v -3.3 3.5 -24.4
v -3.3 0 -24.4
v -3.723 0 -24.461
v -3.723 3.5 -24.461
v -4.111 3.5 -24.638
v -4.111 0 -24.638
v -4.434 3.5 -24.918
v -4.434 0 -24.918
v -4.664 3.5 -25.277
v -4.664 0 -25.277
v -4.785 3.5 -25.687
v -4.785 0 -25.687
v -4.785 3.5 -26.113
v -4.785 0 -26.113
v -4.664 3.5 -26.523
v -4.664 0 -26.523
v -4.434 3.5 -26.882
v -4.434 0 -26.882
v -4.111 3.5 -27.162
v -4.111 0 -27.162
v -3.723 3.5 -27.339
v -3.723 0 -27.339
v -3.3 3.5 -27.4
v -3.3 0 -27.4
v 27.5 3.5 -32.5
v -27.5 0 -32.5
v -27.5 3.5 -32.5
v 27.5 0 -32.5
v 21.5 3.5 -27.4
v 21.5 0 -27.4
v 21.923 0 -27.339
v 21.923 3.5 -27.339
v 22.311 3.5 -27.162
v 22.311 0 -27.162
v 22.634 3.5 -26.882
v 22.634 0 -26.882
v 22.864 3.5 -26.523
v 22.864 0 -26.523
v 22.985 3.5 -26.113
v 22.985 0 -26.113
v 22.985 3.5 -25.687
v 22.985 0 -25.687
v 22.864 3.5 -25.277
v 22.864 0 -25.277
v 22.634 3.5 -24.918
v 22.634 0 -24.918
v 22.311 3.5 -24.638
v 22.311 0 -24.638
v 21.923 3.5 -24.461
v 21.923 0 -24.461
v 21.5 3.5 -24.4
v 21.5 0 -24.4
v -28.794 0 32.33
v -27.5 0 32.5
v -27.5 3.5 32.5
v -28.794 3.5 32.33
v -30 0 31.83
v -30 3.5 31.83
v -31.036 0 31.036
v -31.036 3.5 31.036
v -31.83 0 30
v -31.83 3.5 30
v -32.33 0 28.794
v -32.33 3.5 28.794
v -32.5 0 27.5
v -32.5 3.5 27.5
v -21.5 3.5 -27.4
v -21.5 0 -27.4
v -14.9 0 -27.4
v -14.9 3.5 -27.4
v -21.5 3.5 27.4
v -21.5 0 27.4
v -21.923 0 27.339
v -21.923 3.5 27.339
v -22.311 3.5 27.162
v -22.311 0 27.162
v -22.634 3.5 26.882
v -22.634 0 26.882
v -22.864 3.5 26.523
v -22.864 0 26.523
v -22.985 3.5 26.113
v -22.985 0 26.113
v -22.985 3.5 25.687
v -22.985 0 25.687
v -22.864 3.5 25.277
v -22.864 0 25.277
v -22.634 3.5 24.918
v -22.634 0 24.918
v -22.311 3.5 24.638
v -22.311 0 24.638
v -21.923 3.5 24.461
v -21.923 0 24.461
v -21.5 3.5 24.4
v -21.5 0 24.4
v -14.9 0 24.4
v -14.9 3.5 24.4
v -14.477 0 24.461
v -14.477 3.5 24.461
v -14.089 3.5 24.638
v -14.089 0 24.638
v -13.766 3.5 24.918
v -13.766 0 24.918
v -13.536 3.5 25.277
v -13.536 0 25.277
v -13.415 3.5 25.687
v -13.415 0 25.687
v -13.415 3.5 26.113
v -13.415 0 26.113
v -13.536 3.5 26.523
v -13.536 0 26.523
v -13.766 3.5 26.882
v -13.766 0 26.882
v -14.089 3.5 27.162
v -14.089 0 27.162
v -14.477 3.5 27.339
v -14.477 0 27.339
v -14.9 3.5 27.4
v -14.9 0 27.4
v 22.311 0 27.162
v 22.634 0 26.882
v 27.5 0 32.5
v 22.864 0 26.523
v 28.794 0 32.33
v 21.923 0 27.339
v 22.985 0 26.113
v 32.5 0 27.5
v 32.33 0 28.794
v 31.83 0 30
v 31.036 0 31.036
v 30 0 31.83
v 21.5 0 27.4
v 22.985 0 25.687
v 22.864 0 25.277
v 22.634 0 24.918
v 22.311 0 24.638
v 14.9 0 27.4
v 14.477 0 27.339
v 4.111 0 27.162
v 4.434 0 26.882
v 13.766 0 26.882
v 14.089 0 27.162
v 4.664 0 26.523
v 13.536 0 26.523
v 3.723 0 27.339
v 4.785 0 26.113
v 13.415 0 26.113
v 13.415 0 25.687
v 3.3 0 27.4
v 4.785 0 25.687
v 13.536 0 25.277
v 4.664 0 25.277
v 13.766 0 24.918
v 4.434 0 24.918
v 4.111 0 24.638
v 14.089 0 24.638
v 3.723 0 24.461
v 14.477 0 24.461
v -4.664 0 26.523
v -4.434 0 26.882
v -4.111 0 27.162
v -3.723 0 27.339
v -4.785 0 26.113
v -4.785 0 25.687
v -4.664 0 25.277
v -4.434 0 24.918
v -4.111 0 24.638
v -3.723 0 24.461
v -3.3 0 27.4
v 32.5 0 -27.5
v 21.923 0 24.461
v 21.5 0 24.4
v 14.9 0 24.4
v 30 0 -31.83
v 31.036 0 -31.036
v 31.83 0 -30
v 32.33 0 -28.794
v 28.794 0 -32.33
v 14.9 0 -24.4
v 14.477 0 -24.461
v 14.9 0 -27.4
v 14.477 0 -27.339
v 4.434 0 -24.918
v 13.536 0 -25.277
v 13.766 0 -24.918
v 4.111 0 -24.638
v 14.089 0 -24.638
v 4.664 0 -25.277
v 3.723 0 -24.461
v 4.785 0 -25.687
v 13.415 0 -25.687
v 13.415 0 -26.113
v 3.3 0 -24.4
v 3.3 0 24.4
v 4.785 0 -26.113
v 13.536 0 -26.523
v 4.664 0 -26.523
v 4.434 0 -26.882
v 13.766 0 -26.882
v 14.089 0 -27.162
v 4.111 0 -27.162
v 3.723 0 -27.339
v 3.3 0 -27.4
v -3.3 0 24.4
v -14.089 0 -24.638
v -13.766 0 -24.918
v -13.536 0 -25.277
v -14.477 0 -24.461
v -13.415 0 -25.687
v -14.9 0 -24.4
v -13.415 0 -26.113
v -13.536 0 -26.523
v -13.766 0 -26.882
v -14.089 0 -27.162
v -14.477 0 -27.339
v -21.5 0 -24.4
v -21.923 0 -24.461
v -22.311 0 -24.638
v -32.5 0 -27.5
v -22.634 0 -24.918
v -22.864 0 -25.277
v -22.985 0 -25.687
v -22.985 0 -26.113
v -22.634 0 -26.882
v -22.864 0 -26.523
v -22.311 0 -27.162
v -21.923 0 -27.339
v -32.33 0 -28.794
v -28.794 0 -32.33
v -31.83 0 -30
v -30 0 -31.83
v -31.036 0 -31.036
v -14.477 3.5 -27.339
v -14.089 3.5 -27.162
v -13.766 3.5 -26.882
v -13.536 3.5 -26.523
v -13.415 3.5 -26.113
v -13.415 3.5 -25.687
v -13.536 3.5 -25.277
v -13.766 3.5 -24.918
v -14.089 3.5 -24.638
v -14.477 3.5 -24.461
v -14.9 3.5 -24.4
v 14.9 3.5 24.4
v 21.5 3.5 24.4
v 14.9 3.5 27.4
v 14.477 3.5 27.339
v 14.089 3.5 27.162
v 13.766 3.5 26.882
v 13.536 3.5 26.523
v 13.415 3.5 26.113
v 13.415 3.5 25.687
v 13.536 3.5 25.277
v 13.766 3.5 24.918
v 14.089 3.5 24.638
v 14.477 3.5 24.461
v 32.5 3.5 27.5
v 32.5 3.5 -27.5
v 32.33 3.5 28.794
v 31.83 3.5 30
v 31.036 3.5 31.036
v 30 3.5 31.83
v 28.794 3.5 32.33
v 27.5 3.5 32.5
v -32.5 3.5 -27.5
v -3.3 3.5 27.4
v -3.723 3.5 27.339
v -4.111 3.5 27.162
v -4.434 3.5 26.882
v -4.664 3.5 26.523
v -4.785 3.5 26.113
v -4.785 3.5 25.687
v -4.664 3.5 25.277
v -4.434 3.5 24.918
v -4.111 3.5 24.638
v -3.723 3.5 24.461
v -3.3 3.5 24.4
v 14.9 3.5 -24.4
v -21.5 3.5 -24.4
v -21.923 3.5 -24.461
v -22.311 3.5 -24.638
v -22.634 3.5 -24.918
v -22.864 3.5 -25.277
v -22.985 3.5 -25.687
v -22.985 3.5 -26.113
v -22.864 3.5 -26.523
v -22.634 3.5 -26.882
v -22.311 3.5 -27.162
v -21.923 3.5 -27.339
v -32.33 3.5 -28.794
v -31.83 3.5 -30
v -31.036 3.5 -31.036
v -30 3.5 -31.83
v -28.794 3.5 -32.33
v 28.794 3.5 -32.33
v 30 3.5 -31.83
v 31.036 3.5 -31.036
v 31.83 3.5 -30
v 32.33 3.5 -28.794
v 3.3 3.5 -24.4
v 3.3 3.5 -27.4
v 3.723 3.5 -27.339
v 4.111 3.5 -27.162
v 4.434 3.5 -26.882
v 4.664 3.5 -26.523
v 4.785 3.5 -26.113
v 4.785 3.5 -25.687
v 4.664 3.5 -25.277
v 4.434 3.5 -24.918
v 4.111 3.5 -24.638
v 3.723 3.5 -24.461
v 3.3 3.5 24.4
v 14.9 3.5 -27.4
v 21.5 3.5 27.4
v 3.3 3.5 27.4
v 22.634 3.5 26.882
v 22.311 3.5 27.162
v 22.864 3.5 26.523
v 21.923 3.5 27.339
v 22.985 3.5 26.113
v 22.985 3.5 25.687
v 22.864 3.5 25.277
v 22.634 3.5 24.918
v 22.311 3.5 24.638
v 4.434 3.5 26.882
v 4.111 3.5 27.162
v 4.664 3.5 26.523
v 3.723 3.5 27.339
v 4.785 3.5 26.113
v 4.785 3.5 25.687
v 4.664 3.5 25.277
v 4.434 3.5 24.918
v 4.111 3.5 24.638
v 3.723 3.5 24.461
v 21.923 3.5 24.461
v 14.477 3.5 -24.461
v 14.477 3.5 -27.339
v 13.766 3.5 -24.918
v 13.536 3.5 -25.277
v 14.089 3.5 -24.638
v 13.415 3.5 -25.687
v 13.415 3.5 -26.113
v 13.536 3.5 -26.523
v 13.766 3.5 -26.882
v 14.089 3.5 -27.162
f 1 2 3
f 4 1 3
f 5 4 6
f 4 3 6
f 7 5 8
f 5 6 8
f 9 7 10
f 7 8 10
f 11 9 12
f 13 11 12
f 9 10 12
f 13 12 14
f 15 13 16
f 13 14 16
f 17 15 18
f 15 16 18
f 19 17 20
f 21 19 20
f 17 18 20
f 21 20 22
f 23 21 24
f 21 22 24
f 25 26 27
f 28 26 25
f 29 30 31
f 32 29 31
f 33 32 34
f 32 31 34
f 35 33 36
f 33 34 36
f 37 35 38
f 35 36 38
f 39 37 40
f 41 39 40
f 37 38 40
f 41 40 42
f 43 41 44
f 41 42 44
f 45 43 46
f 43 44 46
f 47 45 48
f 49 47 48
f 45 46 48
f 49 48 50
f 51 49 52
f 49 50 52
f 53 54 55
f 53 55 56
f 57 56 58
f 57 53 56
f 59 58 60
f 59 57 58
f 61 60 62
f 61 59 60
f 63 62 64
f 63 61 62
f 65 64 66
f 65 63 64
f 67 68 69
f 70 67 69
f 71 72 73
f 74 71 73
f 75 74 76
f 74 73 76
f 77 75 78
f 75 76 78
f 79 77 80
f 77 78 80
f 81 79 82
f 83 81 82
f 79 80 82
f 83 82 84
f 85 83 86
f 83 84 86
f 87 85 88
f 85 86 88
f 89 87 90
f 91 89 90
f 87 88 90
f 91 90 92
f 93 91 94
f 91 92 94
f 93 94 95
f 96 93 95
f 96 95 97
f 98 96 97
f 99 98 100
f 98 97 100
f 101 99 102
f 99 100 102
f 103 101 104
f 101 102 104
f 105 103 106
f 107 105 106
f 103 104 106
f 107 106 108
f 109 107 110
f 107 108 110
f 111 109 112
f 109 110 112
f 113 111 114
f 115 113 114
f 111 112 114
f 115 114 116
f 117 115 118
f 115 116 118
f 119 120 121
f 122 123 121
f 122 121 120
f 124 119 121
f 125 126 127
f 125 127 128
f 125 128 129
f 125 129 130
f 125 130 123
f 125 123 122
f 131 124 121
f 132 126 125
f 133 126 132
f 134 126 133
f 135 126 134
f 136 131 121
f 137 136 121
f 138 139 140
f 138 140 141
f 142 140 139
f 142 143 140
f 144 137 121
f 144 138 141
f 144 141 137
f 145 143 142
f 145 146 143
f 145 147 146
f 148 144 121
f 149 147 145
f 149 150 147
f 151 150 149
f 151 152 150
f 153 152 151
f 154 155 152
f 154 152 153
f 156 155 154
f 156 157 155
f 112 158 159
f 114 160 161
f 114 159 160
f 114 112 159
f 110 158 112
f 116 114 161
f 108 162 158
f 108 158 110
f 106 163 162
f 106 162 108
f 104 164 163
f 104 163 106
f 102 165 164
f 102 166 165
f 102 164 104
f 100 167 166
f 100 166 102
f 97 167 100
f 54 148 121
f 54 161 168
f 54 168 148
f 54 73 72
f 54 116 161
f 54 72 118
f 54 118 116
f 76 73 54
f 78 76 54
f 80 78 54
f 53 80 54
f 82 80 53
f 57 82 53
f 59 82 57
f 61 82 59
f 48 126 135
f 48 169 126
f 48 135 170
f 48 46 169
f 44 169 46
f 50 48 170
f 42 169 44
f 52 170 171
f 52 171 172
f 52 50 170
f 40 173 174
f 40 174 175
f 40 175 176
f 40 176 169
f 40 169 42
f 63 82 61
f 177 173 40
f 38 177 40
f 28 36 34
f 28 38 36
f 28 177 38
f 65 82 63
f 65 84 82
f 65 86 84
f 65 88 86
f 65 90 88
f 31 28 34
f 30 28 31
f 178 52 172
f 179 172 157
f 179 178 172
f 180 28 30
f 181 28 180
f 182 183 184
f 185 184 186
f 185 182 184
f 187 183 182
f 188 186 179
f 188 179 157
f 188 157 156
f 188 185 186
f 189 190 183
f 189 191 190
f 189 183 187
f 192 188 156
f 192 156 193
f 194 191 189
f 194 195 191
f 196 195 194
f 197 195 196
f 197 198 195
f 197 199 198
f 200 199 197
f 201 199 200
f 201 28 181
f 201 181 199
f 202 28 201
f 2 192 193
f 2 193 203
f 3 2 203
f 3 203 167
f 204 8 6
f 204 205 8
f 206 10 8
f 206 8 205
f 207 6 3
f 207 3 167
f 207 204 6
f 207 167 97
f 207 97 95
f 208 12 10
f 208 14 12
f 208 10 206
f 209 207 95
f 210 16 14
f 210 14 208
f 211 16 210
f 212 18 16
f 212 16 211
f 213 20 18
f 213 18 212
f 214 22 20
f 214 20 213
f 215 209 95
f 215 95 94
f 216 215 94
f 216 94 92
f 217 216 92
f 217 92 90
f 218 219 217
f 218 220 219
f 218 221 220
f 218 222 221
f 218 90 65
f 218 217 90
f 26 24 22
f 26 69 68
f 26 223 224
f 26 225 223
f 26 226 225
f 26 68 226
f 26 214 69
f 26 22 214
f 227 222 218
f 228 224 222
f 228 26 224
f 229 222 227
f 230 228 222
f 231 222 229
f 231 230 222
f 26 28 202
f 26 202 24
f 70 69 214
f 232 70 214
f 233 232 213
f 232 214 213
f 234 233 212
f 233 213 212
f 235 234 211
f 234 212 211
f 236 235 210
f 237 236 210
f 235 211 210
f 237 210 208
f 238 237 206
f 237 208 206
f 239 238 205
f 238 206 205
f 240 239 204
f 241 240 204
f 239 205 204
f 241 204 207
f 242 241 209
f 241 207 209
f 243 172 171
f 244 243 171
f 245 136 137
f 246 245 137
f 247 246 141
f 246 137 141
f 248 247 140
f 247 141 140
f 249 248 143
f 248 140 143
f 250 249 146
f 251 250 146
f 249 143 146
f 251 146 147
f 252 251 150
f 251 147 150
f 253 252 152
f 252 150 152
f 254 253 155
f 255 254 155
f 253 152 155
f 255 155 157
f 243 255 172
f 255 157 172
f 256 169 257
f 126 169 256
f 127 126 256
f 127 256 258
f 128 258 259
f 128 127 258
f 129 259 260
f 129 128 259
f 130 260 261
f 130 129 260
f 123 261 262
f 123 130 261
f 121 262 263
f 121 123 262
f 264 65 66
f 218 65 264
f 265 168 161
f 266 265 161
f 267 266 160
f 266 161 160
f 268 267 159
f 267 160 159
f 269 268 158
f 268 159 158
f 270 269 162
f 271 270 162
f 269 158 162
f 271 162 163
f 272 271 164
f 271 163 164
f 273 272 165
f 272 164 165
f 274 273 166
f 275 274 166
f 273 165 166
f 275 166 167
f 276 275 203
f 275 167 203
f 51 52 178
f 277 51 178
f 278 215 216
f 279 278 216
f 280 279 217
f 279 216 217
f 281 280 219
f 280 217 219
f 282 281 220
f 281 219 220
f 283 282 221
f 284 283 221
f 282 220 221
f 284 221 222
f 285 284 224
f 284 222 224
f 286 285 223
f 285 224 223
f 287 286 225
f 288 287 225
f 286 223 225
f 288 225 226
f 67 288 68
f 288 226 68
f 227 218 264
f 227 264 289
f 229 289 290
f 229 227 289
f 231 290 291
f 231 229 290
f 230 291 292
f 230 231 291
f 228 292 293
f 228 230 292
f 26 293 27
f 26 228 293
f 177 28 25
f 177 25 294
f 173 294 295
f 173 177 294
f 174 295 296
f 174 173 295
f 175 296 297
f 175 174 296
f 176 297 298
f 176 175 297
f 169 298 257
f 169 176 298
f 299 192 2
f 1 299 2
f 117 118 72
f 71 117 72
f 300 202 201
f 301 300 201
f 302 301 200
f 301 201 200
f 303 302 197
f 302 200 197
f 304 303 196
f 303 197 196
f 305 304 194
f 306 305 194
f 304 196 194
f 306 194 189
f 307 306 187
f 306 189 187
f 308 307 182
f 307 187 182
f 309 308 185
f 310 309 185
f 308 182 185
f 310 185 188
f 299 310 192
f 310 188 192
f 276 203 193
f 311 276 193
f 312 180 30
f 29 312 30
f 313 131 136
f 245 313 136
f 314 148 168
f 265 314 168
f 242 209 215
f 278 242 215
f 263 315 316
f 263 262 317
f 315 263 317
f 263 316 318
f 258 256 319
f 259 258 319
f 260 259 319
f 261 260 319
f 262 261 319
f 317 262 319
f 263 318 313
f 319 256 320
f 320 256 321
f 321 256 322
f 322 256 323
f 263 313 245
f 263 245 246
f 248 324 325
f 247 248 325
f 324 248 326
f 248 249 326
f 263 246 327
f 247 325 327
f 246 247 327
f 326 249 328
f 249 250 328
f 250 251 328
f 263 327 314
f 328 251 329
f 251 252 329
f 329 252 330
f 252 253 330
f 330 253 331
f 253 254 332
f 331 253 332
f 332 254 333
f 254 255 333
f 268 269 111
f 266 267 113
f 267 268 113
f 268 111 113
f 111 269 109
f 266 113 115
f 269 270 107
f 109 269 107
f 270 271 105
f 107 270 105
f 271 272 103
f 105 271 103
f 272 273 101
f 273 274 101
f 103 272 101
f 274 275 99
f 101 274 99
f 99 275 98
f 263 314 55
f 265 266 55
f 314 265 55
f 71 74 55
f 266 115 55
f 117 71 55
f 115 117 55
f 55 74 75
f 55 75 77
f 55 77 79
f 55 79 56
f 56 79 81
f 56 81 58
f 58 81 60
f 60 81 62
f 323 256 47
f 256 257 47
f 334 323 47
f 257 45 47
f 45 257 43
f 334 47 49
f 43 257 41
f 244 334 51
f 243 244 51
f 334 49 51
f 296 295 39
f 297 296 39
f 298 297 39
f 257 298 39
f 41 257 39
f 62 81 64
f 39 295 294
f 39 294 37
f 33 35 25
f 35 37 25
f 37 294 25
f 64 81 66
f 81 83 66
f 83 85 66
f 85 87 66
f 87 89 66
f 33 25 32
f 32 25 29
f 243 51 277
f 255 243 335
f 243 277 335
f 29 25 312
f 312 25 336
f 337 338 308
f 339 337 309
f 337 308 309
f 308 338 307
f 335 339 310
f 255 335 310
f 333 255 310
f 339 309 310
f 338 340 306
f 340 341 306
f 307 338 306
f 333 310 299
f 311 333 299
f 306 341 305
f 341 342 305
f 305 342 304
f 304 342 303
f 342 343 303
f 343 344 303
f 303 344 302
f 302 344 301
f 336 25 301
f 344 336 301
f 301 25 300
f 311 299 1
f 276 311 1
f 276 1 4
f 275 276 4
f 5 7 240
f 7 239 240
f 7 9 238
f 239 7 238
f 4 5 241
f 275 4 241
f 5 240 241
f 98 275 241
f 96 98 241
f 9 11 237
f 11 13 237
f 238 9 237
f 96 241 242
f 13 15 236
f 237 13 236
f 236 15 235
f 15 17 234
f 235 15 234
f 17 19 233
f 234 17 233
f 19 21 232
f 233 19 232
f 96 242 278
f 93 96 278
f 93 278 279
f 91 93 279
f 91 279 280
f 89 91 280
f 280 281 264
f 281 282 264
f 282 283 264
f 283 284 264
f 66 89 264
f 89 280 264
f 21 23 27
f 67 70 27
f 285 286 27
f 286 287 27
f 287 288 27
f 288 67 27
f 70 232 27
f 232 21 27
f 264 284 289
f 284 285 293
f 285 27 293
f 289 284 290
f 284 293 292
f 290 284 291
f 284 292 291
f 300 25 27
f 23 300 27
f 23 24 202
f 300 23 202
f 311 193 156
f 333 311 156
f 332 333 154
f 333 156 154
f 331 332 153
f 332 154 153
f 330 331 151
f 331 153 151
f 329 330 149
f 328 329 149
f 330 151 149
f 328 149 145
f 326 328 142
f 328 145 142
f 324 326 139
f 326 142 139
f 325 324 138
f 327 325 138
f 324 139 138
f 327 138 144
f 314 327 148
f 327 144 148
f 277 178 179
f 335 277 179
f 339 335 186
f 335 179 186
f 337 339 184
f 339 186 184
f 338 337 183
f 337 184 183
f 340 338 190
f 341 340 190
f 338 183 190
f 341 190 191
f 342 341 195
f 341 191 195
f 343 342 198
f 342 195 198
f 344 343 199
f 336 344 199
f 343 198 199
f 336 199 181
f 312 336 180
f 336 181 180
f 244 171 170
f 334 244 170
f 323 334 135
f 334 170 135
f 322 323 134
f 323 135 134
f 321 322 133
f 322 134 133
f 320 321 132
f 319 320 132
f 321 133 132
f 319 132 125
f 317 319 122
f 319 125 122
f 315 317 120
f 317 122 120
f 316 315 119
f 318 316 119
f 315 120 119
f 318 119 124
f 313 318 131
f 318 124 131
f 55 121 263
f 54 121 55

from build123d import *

# Parameters (mm, degrees)
BOSS_EXTRUDE1_DEPTH = 3.5


with BuildPart() as part:
    # Sketch1 → Boss-Extrude1 (new body)
    with BuildSketch(Plane(origin=(0, 0, 0), x_dir=(1, 0, 0), z_dir=(0, 1, 0))):
        with BuildLine():
            Line((-27.5, 32.5), (27.5, 32.5))
            ThreePointArc((27.5, 32.5), (31.035533906, 31.035533906), (32.5, 27.5))
            Line((32.5, 27.5), (32.5, -27.5))
            ThreePointArc((32.5, -27.5), (31.035533906, -31.035533906), (27.5, -32.5))
            Line((27.5, -32.5), (-27.5, -32.5))
            ThreePointArc((-27.5, -32.5), (-31.035533906, -31.035533906), (-32.5, -27.5))
            Line((-32.5, -27.5), (-32.5, 27.5))
            ThreePointArc((-32.5, 27.5), (-31.035533906, 31.035533906), (-27.5, 32.5))
        make_face()
        with BuildLine():
            Line((-21.5, -24.4), (-14.9, -24.4))
            ThreePointArc((-14.9, -24.4), (-13.4, -25.9), (-14.9, -27.4))
            Line((-14.9, -27.4), (-21.5, -27.4))
            ThreePointArc((-21.5, -27.4), (-23, -25.9), (-21.5, -24.4))
        make_face(mode=Mode.SUBTRACT)
        with BuildLine():
            Line((21.5, -27.4), (14.9, -27.4))
            ThreePointArc((14.9, -27.4), (13.4, -25.9), (14.9, -24.4))
            Line((14.9, -24.4), (21.5, -24.4))
            ThreePointArc((21.5, -24.4), (23, -25.9), (21.5, -27.4))
        make_face(mode=Mode.SUBTRACT)
        with BuildLine():
            Line((21.5, 24.4), (14.9, 24.4))
            ThreePointArc((14.9, 24.4), (13.4, 25.9), (14.9, 27.4))
            Line((14.9, 27.4), (21.5, 27.4))
            ThreePointArc((21.5, 27.4), (23, 25.9), (21.5, 24.4))
        make_face(mode=Mode.SUBTRACT)
        with BuildLine():
            Line((-21.5, 27.4), (-14.9, 27.4))
            ThreePointArc((-14.9, 27.4), (-13.4, 25.9), (-14.9, 24.4))
            Line((-14.9, 24.4), (-21.5, 24.4))
            ThreePointArc((-21.5, 24.4), (-23, 25.9), (-21.5, 27.4))
        make_face(mode=Mode.SUBTRACT)
        with BuildLine():
            Line((-3.3, -24.4), (3.3, -24.4))
            ThreePointArc((3.3, -24.4), (4.8, -25.9), (3.3, -27.4))
            Line((3.3, -27.4), (-3.3, -27.4))
            ThreePointArc((-3.3, -27.4), (-4.8, -25.9), (-3.3, -24.4))
        make_face(mode=Mode.SUBTRACT)
        with BuildLine():
            Line((-3.3, 27.4), (3.3, 27.4))
            ThreePointArc((3.3, 27.4), (4.8, 25.9), (3.3, 24.4))
            Line((3.3, 24.4), (-3.3, 24.4))
            ThreePointArc((-3.3, 24.4), (-4.8, 25.9), (-3.3, 27.4))
        make_face(mode=Mode.SUBTRACT)
    extrude(amount=BOSS_EXTRUDE1_DEPTH)


solid = part.part
